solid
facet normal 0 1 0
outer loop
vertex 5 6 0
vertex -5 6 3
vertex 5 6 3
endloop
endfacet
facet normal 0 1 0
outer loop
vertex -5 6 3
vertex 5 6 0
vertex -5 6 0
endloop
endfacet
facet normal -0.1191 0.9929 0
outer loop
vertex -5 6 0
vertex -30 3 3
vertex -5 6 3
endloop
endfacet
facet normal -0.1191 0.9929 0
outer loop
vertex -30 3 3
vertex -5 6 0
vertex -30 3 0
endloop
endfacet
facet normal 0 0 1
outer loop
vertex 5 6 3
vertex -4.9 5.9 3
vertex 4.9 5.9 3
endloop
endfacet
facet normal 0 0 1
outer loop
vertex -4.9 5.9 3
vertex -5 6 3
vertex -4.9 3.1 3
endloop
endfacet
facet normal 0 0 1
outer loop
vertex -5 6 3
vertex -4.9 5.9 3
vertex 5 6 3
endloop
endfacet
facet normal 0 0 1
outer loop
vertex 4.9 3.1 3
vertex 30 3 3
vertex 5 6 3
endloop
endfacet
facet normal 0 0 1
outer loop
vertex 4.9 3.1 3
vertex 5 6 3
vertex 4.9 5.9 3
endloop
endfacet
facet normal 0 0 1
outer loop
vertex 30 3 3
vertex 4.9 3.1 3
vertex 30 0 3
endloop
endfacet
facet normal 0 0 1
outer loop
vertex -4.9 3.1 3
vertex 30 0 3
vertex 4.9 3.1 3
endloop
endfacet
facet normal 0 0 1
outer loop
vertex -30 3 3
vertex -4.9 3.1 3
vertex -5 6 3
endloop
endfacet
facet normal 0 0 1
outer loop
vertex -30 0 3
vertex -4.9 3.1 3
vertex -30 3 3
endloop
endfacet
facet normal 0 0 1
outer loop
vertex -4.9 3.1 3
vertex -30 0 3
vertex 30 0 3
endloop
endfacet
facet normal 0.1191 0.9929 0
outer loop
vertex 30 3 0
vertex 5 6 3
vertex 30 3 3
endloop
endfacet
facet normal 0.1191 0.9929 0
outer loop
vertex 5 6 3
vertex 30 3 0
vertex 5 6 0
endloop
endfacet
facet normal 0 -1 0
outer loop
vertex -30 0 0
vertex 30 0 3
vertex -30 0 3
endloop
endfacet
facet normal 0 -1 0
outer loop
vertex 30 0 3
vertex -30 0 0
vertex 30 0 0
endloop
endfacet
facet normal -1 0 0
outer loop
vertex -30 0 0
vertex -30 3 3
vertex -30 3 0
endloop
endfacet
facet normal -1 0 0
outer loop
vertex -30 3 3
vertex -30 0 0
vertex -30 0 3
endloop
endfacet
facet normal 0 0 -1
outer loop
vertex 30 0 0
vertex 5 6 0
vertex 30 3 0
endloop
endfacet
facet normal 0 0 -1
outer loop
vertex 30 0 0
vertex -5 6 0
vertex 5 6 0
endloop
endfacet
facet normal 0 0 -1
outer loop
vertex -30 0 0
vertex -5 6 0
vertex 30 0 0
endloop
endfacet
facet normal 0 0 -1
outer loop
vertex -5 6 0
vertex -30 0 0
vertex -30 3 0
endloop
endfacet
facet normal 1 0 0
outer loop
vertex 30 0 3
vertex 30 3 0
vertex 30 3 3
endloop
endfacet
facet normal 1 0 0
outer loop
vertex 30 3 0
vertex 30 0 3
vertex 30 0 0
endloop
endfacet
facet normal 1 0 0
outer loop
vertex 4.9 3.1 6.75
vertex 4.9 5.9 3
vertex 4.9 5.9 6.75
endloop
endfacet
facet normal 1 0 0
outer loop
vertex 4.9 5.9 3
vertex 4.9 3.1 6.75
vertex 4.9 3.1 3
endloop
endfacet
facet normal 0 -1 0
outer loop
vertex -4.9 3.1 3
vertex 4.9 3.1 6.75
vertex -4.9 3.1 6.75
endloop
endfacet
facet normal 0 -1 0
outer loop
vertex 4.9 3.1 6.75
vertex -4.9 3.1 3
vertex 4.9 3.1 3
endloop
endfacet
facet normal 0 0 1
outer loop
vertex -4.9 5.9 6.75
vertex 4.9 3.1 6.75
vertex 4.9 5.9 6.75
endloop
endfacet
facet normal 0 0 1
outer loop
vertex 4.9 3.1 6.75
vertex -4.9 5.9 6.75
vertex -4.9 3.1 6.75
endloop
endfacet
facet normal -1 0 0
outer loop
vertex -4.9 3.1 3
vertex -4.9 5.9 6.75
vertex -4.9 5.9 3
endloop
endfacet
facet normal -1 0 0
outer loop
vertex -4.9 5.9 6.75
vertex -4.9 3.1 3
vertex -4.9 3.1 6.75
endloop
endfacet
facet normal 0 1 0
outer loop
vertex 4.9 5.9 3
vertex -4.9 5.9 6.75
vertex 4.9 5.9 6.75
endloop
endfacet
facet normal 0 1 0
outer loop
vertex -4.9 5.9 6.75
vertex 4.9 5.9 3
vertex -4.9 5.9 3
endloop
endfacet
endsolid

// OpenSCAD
// file: common.scad
$fn = 100;

function outer_diam(d, fn=$fn) = 1/cos(180/fn) * d;

// gear
gear_diam = 90;
gear_thickness = 4;
gear_spur_depth = 2;
gear_rim_width = 3;

// stand (vertical beam with servo mount)
gear_diameter = gear_diam;
body_length = 23.2;
body_width = 12.5;
body_height = 22.6;
mount_height = 2.8;
mount_offset = 21 - mount_height;
mount_length = 32.5;
gear_hood_diam = 12;
gear_hood_height = 5.7;
arm_spacing = 2.5;
mount_hole_diam = 1.75;
mount_hole_offset = (27.8 - body_length)/2;
stand_rim_width = 3;
stand_thickness = 3;
stand_height = 120;
stand_width = 10;
// main file
include <common.scad>;

foot_length = 3 * stand_width;
foot_length = gear_diam * 2/3;

module foot() {
  linear_extrude(height = stand_thickness) {
    hull() {
      translate([-stand_width/2, stand_rim_width])
        square([stand_width, stand_thickness]);

      translate([-foot_length/2, 0])
        square([foot_length, stand_thickness]);
    }
  }
  linear_extrude(height = 2.25 * stand_thickness)
    translate([-stand_width/2, stand_rim_width])
      offset(r=-0.1)
        square([stand_width, stand_thickness]);
}

foot();
